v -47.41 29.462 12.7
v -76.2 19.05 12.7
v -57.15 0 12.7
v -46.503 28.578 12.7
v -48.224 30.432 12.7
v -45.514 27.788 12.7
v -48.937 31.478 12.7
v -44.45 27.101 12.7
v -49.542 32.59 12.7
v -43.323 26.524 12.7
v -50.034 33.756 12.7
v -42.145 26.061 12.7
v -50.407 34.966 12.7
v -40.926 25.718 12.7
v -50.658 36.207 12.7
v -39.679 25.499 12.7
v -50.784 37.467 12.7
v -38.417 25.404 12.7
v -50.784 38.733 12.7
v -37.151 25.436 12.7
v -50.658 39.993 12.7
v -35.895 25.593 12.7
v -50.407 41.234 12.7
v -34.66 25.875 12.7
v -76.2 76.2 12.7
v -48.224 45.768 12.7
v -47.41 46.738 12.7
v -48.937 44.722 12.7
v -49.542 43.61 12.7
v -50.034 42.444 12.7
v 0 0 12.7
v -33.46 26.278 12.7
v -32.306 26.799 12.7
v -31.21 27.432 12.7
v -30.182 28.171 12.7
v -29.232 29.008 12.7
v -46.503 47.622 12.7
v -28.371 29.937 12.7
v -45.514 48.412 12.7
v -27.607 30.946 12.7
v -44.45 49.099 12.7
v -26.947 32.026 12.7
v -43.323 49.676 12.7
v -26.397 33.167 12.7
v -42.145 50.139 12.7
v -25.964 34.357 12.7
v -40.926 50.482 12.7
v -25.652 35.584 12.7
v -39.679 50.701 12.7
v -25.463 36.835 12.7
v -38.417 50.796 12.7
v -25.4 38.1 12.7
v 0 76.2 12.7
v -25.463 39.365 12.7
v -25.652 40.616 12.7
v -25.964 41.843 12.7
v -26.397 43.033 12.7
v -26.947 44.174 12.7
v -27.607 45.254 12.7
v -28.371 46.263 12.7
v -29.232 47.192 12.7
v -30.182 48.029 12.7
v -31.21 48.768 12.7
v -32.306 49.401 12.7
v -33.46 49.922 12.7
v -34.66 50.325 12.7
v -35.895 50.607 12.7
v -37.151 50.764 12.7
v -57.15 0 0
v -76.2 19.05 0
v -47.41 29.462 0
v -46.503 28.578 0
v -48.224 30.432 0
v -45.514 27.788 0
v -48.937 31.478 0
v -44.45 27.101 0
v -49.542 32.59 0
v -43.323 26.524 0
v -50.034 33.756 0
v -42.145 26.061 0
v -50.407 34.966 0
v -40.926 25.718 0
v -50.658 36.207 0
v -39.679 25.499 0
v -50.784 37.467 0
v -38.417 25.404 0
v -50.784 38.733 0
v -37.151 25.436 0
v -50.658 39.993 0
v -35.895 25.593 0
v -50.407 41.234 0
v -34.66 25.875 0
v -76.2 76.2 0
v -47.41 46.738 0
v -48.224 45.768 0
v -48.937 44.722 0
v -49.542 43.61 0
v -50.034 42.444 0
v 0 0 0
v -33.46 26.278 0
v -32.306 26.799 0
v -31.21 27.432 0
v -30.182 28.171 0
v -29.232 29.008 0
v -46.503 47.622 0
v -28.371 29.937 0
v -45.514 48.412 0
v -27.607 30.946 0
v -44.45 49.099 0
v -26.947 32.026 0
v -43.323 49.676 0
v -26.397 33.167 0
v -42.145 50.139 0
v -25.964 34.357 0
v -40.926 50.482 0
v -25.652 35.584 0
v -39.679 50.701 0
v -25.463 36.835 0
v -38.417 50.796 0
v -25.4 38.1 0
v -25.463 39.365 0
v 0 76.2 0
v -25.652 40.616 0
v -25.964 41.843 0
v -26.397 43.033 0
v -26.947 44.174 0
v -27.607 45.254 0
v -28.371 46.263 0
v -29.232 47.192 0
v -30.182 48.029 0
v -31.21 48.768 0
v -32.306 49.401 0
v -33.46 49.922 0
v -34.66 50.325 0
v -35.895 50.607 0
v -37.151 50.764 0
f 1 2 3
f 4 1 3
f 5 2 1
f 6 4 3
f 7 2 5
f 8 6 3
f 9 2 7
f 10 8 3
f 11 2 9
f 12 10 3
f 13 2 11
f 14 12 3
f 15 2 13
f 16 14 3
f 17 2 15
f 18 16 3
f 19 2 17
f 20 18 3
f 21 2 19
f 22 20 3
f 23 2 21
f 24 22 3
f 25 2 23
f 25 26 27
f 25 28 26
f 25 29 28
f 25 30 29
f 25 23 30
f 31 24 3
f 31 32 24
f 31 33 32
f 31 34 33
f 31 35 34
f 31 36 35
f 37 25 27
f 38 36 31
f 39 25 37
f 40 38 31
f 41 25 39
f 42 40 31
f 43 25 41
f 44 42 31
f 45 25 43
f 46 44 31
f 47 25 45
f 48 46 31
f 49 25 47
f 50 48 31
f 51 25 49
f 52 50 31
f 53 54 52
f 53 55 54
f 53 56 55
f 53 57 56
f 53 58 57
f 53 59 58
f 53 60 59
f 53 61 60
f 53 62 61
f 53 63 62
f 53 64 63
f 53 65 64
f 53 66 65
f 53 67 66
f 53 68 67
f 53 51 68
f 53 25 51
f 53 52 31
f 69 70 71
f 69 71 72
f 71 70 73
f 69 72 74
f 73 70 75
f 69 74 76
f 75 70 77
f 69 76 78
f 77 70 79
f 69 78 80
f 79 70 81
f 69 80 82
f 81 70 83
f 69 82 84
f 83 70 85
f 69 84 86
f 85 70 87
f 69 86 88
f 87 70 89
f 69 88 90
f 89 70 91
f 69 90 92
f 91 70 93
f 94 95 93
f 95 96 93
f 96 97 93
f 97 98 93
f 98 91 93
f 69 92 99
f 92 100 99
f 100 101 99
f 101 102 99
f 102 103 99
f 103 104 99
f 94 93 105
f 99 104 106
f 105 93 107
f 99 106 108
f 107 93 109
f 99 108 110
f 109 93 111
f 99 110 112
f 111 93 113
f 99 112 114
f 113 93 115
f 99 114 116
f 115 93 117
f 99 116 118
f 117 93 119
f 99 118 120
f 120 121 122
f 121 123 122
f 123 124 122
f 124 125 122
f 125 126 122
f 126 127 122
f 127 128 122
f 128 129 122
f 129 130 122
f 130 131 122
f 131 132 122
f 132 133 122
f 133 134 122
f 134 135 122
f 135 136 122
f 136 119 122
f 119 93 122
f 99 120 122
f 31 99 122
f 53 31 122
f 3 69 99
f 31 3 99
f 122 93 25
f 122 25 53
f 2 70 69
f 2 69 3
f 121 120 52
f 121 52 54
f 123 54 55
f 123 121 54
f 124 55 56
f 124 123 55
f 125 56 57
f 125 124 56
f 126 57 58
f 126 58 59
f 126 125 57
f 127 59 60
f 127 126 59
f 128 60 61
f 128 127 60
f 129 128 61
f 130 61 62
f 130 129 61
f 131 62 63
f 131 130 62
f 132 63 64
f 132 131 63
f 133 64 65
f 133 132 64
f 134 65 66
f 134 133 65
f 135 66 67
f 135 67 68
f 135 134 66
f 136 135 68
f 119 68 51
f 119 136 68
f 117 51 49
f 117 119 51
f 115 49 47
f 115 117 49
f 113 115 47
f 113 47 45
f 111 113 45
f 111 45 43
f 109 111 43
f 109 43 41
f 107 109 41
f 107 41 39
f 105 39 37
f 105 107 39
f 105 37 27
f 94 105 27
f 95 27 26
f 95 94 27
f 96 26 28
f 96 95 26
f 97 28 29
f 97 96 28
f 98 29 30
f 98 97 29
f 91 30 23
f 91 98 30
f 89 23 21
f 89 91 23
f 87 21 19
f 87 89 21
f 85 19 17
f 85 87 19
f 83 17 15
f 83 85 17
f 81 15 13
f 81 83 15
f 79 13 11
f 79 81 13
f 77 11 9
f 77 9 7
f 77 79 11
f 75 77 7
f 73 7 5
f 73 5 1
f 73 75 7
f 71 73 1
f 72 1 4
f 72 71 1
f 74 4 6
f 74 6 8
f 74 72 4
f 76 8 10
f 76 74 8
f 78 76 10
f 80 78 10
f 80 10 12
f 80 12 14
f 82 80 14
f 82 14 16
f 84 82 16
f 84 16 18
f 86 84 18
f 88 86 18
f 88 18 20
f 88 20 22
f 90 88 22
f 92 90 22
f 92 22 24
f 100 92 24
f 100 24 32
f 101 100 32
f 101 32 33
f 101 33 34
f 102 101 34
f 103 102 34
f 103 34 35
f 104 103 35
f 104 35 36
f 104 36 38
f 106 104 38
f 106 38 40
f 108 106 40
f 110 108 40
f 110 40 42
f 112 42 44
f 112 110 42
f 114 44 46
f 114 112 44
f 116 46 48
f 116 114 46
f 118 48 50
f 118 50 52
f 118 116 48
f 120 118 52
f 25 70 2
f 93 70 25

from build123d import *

# Parameters (mm, degrees)
SKETCH1_W           = 76.2
SKETCH1_H           = 76.2
SKETCH1_R           = 12.7
BOSS_EXTRUDE1_DEPTH = 12.7
CHAMFER1_SIZE       = 19.05


with BuildPart() as part:
    # Sketch1 → Boss-Extrude1 (new body)
    with BuildSketch(Plane.XY):
        with Locations((-38.1, 38.1)):
            Rectangle(SKETCH1_W, SKETCH1_H)
        with Locations((-38.1, 38.1)):
            Circle(SKETCH1_R, mode=Mode.SUBTRACT)
    extrude(amount=BOSS_EXTRUDE1_DEPTH)

    # Chamfer1
    chamfer1_edges = [part.edges().sort_by_distance(p)[0] for p in [
        (-76.2, 0, 6.35),
    ]]
    chamfer(chamfer1_edges, length=CHAMFER1_SIZE)


solid = part.part
